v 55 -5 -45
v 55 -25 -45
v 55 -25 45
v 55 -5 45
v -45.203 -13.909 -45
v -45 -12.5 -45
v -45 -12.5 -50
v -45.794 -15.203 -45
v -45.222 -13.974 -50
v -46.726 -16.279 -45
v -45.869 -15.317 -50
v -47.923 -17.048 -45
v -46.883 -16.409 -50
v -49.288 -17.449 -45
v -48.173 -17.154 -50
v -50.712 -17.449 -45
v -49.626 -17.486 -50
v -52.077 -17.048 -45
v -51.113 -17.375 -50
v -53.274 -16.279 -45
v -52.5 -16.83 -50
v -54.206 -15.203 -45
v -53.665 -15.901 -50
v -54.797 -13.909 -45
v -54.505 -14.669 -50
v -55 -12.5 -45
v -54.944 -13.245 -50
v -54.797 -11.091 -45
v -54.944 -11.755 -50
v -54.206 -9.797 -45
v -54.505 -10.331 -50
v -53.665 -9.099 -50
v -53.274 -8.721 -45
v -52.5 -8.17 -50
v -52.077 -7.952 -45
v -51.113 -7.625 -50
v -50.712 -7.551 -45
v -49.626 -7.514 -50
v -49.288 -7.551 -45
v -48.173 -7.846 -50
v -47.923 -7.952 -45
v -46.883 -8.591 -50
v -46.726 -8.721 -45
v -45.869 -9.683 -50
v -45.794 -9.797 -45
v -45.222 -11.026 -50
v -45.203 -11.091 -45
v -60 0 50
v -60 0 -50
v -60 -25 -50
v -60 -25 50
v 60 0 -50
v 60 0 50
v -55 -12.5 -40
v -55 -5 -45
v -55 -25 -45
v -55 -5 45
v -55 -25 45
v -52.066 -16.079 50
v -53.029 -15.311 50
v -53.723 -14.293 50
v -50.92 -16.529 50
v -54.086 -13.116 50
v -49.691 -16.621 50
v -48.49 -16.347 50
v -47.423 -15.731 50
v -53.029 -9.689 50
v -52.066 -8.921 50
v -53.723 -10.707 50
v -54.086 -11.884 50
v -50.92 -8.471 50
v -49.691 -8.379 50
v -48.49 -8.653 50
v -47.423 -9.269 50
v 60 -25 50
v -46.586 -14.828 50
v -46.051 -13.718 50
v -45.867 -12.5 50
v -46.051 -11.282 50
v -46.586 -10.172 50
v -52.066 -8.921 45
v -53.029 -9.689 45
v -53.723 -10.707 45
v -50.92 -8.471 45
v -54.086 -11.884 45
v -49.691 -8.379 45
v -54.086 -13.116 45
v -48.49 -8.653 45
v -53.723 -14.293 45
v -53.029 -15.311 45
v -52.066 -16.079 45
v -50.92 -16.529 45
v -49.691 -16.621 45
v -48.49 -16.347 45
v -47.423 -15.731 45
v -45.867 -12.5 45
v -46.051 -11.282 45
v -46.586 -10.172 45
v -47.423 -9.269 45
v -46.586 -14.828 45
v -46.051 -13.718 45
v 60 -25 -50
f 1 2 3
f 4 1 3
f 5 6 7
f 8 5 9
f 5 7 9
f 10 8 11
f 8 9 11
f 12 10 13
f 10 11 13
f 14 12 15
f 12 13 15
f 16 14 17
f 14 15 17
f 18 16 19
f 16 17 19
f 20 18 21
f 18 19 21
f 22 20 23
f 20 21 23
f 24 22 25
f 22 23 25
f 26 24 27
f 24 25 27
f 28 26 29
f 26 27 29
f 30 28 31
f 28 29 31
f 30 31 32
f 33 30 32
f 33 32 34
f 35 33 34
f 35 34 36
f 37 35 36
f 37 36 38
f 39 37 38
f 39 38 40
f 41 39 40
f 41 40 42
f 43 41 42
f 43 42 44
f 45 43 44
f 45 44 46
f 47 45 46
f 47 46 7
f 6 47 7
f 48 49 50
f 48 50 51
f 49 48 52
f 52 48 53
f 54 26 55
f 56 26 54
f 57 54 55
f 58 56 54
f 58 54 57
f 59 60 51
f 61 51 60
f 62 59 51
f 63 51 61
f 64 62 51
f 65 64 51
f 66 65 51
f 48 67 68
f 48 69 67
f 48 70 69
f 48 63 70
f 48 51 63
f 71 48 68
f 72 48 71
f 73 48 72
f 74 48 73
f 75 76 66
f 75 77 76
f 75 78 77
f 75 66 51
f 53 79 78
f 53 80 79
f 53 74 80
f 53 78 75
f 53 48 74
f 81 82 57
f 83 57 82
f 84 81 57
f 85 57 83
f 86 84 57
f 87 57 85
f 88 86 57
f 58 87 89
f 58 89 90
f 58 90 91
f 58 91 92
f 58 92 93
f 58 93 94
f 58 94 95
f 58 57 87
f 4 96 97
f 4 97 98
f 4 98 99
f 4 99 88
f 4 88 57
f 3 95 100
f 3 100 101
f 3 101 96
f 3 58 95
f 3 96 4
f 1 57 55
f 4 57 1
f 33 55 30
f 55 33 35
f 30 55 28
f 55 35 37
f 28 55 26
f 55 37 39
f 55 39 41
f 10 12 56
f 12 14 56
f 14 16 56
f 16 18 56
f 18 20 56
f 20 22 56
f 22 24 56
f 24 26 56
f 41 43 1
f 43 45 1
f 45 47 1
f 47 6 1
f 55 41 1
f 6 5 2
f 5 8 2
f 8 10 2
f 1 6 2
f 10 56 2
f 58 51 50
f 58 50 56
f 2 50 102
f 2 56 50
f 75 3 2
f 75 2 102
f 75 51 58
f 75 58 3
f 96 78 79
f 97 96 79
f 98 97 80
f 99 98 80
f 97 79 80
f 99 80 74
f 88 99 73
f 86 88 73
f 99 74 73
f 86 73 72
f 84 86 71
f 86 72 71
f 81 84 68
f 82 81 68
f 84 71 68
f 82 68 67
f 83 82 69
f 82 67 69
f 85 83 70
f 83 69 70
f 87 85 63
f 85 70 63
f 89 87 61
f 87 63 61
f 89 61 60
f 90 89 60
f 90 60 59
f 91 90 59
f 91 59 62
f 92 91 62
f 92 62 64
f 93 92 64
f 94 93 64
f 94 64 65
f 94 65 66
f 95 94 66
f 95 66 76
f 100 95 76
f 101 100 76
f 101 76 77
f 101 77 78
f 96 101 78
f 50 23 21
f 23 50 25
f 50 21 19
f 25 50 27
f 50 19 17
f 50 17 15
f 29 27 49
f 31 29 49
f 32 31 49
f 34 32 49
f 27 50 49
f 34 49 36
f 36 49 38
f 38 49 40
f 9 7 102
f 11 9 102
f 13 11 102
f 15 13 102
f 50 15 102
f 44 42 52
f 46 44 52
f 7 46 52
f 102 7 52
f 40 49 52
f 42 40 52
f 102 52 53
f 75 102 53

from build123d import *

# Parameters (mm, degrees)
F0_W      = 120
F0_H      = 100
F1_DEPTH  = 25
F2_W      = 110
F2_H      = 90
F3_DEPTH  = 20
F4_R      = 5
F3_FACE_W = 110
F3_FACE_H = 20
F5_DEPTH  = 10
F6_R      = 4.1325775989
F7_DEPTH  = 10


with BuildPart() as f1:
    # F0 (on Front) → F1 (new body)
    with BuildSketch(Plane.XZ):
        Rectangle(F0_W, F0_H)
    extrude(amount=F1_DEPTH)

    # F2 (on face) → F3 (cut)
    with BuildSketch(Plane.XZ.offset(25)):
        Rectangle(F2_W, F2_H)
    extrude(amount=-F3_DEPTH, mode=Mode.SUBTRACT)

    # F4 (on face) + F3_face (on face) → F5 (cut)
    with BuildSketch(Plane(origin=(0, 0, -50), x_dir=(1, 0, 0), z_dir=(0, 0, -1))):
        with Locations((-50, 12.5)):
            Circle(F4_R)
    with BuildSketch(Plane(origin=(0, -15, -45), x_dir=(1, 0, 0), z_dir=(0, 0, 1))):
        Rectangle(F3_FACE_W, F3_FACE_H)
    extrude(amount=-F5_DEPTH, dir=(0, 0, -1), mode=Mode.SUBTRACT)

    # F6 (on face) → F7 (cut)
    with BuildSketch(Plane.XY.offset(50)):
        with Locations((-50, -12.5)):
            Circle(F6_R)
    extrude(amount=-F7_DEPTH, mode=Mode.SUBTRACT)


solid = f1.part
